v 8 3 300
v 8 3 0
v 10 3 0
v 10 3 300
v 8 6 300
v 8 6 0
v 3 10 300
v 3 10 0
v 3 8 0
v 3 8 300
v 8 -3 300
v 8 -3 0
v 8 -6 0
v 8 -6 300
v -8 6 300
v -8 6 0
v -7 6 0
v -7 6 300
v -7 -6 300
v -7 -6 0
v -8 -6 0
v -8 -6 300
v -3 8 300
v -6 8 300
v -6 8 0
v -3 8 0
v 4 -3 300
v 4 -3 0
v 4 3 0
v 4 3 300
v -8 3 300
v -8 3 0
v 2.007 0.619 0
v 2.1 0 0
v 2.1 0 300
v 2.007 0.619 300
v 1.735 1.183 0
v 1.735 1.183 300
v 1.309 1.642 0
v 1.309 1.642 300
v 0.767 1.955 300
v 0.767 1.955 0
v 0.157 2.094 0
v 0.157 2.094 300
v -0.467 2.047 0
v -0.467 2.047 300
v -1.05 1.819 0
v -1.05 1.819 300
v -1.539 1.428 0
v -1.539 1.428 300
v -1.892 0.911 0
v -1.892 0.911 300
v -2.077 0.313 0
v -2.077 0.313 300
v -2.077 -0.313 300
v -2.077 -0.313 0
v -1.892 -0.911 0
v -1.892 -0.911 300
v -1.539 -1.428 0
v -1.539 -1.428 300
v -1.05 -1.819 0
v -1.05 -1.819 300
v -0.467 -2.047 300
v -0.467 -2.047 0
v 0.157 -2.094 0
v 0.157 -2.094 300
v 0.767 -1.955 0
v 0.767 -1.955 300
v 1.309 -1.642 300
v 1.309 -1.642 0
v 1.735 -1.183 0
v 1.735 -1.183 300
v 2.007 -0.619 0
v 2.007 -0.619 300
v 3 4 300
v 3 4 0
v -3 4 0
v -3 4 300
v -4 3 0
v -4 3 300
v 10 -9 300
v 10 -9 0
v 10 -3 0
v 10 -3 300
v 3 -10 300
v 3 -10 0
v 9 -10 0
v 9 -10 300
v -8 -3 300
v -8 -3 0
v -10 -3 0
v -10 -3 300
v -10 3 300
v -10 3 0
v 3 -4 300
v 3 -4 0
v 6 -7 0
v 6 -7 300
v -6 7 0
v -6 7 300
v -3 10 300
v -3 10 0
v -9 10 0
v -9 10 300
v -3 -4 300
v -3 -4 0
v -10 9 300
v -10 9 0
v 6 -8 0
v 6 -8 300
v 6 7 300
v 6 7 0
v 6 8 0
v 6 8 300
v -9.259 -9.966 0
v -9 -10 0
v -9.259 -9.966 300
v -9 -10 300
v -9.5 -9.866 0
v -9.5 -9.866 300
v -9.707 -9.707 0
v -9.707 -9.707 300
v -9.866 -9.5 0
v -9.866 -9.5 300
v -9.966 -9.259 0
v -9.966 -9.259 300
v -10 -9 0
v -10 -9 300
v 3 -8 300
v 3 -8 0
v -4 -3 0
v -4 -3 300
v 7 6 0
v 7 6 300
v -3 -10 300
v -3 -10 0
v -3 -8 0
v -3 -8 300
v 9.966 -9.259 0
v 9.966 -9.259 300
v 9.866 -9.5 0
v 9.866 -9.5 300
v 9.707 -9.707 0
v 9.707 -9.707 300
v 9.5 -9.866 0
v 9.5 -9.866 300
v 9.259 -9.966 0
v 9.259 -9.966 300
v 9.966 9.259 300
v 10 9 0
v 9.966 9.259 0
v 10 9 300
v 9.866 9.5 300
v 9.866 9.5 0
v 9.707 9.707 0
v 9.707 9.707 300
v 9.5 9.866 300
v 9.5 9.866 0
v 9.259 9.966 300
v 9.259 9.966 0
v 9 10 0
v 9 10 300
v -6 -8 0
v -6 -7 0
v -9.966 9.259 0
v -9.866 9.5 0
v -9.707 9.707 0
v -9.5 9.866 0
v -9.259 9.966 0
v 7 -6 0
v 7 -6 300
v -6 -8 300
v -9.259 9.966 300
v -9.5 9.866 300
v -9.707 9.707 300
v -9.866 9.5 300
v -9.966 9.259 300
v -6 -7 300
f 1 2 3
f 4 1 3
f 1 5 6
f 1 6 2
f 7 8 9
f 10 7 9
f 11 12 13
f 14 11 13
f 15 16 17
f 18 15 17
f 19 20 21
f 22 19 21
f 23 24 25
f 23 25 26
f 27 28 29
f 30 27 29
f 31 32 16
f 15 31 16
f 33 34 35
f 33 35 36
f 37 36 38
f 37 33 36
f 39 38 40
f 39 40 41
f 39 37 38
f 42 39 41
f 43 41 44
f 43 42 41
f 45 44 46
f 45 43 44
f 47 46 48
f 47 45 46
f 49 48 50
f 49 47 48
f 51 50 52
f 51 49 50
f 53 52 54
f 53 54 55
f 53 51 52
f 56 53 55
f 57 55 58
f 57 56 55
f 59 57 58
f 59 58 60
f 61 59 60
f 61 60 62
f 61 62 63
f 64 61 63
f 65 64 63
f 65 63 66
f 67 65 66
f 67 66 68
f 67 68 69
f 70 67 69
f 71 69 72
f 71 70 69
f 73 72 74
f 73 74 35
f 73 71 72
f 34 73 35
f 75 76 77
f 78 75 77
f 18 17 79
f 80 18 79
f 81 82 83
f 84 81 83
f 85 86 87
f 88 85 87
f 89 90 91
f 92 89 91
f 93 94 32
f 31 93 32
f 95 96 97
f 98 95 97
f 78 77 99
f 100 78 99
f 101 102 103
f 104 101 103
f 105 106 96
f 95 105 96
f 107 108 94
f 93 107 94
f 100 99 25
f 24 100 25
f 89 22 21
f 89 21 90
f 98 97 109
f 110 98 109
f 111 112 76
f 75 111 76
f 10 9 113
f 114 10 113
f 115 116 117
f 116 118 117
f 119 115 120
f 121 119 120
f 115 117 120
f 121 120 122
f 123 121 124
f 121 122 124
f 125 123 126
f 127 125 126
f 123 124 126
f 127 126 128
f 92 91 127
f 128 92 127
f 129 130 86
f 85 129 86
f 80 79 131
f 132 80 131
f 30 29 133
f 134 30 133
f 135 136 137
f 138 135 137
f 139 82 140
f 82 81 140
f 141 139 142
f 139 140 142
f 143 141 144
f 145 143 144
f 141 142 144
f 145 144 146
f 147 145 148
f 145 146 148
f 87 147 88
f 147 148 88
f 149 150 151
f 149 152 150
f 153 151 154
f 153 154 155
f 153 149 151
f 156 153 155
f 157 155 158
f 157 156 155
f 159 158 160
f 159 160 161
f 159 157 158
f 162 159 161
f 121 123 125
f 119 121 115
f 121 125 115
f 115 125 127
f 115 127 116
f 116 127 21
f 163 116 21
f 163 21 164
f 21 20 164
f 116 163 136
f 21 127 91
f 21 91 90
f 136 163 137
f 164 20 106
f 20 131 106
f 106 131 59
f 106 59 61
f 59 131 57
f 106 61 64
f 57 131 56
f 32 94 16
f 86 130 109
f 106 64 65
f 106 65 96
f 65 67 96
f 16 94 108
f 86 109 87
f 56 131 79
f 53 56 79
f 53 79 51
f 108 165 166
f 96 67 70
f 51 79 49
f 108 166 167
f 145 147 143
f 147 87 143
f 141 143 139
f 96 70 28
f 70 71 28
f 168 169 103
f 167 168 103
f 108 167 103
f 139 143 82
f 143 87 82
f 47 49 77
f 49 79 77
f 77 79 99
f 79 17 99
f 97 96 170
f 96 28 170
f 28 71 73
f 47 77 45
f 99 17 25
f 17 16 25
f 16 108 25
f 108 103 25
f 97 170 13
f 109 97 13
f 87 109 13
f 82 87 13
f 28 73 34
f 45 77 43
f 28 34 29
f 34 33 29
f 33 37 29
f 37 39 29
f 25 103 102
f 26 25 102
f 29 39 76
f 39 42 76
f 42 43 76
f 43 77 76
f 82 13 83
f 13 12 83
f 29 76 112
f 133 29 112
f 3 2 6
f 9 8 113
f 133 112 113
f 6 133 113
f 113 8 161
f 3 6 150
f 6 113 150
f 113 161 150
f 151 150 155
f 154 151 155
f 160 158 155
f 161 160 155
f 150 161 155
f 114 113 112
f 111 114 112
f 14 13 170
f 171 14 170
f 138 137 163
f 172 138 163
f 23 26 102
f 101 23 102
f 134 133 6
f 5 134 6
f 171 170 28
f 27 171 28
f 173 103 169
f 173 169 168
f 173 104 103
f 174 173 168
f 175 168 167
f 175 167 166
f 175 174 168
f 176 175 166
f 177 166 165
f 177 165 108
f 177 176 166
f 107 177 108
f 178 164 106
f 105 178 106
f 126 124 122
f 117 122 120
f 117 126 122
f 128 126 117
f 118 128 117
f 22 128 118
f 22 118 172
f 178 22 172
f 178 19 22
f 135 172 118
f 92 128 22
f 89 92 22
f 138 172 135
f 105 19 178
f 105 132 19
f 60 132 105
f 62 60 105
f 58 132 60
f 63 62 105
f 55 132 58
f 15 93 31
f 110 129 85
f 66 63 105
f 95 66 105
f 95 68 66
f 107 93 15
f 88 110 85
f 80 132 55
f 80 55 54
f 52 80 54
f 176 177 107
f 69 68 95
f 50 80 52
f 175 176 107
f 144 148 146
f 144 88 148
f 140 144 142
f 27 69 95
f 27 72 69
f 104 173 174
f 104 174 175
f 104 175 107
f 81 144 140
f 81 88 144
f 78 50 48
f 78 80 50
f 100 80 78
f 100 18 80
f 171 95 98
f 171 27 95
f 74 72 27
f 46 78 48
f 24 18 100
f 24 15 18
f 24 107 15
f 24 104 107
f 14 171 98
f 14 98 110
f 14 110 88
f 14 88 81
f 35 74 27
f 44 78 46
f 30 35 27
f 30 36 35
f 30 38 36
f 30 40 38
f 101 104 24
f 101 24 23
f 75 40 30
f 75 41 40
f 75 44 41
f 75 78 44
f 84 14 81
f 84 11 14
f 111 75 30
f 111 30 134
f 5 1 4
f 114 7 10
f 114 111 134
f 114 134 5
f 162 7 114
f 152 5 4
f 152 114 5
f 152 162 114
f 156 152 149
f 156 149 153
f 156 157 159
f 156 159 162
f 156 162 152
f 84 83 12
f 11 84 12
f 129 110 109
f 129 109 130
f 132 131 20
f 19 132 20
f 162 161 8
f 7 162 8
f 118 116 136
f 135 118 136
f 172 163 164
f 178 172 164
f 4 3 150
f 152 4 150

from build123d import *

# Parameters (mm, degrees)
SCHIZZO1_R                   = 2.1
ESTRUSIONE_ESTRUSIONE1_DEPTH = 300
RACCORDO1_R                  = 1


with BuildPart() as part:
    # Schizzo1 → Estrusione-Estrusione1 (new body)
    with BuildSketch(Plane.XY):
        Polygon((10, 3), (10, 10), (3, 10), (3, 8), (6, 8), (6, 7), (3, 4), (-3, 4), (-6, 7), (-6, 8), (-3, 8), (-3, 10), (-10, 10), (-10, 3), (-8, 3), (-8, 6), (-7, 6), (-4, 3), (-4, -3), (-7, -6), (-8, -6), (-8, -3), (-10, -3), (-10, -10), (-3, -10), (-3, -8), (-6, -8), (-6, -7), (-3, -4), (3, -4), (6, -7), (6, -8), (3, -8), (3, -10), (10, -10), (10, -3), (8, -3), (8, -6), (7, -6), (4, -3), (4, 3), (7, 6), (8, 6), (8, 3), align=None)
        Circle(SCHIZZO1_R, mode=Mode.SUBTRACT)
    extrude(amount=ESTRUSIONE_ESTRUSIONE1_DEPTH)

    # Raccordo1
    raccordo1_edges = [part.edges().sort_by_distance(p)[0] for p in [
        (-10, 10, 150),
        (10, 10, 150),
        (10, -10, 150),
        (-10, -10, 150),
    ]]
    fillet(raccordo1_edges, radius=RACCORDO1_R)


solid = part.part
